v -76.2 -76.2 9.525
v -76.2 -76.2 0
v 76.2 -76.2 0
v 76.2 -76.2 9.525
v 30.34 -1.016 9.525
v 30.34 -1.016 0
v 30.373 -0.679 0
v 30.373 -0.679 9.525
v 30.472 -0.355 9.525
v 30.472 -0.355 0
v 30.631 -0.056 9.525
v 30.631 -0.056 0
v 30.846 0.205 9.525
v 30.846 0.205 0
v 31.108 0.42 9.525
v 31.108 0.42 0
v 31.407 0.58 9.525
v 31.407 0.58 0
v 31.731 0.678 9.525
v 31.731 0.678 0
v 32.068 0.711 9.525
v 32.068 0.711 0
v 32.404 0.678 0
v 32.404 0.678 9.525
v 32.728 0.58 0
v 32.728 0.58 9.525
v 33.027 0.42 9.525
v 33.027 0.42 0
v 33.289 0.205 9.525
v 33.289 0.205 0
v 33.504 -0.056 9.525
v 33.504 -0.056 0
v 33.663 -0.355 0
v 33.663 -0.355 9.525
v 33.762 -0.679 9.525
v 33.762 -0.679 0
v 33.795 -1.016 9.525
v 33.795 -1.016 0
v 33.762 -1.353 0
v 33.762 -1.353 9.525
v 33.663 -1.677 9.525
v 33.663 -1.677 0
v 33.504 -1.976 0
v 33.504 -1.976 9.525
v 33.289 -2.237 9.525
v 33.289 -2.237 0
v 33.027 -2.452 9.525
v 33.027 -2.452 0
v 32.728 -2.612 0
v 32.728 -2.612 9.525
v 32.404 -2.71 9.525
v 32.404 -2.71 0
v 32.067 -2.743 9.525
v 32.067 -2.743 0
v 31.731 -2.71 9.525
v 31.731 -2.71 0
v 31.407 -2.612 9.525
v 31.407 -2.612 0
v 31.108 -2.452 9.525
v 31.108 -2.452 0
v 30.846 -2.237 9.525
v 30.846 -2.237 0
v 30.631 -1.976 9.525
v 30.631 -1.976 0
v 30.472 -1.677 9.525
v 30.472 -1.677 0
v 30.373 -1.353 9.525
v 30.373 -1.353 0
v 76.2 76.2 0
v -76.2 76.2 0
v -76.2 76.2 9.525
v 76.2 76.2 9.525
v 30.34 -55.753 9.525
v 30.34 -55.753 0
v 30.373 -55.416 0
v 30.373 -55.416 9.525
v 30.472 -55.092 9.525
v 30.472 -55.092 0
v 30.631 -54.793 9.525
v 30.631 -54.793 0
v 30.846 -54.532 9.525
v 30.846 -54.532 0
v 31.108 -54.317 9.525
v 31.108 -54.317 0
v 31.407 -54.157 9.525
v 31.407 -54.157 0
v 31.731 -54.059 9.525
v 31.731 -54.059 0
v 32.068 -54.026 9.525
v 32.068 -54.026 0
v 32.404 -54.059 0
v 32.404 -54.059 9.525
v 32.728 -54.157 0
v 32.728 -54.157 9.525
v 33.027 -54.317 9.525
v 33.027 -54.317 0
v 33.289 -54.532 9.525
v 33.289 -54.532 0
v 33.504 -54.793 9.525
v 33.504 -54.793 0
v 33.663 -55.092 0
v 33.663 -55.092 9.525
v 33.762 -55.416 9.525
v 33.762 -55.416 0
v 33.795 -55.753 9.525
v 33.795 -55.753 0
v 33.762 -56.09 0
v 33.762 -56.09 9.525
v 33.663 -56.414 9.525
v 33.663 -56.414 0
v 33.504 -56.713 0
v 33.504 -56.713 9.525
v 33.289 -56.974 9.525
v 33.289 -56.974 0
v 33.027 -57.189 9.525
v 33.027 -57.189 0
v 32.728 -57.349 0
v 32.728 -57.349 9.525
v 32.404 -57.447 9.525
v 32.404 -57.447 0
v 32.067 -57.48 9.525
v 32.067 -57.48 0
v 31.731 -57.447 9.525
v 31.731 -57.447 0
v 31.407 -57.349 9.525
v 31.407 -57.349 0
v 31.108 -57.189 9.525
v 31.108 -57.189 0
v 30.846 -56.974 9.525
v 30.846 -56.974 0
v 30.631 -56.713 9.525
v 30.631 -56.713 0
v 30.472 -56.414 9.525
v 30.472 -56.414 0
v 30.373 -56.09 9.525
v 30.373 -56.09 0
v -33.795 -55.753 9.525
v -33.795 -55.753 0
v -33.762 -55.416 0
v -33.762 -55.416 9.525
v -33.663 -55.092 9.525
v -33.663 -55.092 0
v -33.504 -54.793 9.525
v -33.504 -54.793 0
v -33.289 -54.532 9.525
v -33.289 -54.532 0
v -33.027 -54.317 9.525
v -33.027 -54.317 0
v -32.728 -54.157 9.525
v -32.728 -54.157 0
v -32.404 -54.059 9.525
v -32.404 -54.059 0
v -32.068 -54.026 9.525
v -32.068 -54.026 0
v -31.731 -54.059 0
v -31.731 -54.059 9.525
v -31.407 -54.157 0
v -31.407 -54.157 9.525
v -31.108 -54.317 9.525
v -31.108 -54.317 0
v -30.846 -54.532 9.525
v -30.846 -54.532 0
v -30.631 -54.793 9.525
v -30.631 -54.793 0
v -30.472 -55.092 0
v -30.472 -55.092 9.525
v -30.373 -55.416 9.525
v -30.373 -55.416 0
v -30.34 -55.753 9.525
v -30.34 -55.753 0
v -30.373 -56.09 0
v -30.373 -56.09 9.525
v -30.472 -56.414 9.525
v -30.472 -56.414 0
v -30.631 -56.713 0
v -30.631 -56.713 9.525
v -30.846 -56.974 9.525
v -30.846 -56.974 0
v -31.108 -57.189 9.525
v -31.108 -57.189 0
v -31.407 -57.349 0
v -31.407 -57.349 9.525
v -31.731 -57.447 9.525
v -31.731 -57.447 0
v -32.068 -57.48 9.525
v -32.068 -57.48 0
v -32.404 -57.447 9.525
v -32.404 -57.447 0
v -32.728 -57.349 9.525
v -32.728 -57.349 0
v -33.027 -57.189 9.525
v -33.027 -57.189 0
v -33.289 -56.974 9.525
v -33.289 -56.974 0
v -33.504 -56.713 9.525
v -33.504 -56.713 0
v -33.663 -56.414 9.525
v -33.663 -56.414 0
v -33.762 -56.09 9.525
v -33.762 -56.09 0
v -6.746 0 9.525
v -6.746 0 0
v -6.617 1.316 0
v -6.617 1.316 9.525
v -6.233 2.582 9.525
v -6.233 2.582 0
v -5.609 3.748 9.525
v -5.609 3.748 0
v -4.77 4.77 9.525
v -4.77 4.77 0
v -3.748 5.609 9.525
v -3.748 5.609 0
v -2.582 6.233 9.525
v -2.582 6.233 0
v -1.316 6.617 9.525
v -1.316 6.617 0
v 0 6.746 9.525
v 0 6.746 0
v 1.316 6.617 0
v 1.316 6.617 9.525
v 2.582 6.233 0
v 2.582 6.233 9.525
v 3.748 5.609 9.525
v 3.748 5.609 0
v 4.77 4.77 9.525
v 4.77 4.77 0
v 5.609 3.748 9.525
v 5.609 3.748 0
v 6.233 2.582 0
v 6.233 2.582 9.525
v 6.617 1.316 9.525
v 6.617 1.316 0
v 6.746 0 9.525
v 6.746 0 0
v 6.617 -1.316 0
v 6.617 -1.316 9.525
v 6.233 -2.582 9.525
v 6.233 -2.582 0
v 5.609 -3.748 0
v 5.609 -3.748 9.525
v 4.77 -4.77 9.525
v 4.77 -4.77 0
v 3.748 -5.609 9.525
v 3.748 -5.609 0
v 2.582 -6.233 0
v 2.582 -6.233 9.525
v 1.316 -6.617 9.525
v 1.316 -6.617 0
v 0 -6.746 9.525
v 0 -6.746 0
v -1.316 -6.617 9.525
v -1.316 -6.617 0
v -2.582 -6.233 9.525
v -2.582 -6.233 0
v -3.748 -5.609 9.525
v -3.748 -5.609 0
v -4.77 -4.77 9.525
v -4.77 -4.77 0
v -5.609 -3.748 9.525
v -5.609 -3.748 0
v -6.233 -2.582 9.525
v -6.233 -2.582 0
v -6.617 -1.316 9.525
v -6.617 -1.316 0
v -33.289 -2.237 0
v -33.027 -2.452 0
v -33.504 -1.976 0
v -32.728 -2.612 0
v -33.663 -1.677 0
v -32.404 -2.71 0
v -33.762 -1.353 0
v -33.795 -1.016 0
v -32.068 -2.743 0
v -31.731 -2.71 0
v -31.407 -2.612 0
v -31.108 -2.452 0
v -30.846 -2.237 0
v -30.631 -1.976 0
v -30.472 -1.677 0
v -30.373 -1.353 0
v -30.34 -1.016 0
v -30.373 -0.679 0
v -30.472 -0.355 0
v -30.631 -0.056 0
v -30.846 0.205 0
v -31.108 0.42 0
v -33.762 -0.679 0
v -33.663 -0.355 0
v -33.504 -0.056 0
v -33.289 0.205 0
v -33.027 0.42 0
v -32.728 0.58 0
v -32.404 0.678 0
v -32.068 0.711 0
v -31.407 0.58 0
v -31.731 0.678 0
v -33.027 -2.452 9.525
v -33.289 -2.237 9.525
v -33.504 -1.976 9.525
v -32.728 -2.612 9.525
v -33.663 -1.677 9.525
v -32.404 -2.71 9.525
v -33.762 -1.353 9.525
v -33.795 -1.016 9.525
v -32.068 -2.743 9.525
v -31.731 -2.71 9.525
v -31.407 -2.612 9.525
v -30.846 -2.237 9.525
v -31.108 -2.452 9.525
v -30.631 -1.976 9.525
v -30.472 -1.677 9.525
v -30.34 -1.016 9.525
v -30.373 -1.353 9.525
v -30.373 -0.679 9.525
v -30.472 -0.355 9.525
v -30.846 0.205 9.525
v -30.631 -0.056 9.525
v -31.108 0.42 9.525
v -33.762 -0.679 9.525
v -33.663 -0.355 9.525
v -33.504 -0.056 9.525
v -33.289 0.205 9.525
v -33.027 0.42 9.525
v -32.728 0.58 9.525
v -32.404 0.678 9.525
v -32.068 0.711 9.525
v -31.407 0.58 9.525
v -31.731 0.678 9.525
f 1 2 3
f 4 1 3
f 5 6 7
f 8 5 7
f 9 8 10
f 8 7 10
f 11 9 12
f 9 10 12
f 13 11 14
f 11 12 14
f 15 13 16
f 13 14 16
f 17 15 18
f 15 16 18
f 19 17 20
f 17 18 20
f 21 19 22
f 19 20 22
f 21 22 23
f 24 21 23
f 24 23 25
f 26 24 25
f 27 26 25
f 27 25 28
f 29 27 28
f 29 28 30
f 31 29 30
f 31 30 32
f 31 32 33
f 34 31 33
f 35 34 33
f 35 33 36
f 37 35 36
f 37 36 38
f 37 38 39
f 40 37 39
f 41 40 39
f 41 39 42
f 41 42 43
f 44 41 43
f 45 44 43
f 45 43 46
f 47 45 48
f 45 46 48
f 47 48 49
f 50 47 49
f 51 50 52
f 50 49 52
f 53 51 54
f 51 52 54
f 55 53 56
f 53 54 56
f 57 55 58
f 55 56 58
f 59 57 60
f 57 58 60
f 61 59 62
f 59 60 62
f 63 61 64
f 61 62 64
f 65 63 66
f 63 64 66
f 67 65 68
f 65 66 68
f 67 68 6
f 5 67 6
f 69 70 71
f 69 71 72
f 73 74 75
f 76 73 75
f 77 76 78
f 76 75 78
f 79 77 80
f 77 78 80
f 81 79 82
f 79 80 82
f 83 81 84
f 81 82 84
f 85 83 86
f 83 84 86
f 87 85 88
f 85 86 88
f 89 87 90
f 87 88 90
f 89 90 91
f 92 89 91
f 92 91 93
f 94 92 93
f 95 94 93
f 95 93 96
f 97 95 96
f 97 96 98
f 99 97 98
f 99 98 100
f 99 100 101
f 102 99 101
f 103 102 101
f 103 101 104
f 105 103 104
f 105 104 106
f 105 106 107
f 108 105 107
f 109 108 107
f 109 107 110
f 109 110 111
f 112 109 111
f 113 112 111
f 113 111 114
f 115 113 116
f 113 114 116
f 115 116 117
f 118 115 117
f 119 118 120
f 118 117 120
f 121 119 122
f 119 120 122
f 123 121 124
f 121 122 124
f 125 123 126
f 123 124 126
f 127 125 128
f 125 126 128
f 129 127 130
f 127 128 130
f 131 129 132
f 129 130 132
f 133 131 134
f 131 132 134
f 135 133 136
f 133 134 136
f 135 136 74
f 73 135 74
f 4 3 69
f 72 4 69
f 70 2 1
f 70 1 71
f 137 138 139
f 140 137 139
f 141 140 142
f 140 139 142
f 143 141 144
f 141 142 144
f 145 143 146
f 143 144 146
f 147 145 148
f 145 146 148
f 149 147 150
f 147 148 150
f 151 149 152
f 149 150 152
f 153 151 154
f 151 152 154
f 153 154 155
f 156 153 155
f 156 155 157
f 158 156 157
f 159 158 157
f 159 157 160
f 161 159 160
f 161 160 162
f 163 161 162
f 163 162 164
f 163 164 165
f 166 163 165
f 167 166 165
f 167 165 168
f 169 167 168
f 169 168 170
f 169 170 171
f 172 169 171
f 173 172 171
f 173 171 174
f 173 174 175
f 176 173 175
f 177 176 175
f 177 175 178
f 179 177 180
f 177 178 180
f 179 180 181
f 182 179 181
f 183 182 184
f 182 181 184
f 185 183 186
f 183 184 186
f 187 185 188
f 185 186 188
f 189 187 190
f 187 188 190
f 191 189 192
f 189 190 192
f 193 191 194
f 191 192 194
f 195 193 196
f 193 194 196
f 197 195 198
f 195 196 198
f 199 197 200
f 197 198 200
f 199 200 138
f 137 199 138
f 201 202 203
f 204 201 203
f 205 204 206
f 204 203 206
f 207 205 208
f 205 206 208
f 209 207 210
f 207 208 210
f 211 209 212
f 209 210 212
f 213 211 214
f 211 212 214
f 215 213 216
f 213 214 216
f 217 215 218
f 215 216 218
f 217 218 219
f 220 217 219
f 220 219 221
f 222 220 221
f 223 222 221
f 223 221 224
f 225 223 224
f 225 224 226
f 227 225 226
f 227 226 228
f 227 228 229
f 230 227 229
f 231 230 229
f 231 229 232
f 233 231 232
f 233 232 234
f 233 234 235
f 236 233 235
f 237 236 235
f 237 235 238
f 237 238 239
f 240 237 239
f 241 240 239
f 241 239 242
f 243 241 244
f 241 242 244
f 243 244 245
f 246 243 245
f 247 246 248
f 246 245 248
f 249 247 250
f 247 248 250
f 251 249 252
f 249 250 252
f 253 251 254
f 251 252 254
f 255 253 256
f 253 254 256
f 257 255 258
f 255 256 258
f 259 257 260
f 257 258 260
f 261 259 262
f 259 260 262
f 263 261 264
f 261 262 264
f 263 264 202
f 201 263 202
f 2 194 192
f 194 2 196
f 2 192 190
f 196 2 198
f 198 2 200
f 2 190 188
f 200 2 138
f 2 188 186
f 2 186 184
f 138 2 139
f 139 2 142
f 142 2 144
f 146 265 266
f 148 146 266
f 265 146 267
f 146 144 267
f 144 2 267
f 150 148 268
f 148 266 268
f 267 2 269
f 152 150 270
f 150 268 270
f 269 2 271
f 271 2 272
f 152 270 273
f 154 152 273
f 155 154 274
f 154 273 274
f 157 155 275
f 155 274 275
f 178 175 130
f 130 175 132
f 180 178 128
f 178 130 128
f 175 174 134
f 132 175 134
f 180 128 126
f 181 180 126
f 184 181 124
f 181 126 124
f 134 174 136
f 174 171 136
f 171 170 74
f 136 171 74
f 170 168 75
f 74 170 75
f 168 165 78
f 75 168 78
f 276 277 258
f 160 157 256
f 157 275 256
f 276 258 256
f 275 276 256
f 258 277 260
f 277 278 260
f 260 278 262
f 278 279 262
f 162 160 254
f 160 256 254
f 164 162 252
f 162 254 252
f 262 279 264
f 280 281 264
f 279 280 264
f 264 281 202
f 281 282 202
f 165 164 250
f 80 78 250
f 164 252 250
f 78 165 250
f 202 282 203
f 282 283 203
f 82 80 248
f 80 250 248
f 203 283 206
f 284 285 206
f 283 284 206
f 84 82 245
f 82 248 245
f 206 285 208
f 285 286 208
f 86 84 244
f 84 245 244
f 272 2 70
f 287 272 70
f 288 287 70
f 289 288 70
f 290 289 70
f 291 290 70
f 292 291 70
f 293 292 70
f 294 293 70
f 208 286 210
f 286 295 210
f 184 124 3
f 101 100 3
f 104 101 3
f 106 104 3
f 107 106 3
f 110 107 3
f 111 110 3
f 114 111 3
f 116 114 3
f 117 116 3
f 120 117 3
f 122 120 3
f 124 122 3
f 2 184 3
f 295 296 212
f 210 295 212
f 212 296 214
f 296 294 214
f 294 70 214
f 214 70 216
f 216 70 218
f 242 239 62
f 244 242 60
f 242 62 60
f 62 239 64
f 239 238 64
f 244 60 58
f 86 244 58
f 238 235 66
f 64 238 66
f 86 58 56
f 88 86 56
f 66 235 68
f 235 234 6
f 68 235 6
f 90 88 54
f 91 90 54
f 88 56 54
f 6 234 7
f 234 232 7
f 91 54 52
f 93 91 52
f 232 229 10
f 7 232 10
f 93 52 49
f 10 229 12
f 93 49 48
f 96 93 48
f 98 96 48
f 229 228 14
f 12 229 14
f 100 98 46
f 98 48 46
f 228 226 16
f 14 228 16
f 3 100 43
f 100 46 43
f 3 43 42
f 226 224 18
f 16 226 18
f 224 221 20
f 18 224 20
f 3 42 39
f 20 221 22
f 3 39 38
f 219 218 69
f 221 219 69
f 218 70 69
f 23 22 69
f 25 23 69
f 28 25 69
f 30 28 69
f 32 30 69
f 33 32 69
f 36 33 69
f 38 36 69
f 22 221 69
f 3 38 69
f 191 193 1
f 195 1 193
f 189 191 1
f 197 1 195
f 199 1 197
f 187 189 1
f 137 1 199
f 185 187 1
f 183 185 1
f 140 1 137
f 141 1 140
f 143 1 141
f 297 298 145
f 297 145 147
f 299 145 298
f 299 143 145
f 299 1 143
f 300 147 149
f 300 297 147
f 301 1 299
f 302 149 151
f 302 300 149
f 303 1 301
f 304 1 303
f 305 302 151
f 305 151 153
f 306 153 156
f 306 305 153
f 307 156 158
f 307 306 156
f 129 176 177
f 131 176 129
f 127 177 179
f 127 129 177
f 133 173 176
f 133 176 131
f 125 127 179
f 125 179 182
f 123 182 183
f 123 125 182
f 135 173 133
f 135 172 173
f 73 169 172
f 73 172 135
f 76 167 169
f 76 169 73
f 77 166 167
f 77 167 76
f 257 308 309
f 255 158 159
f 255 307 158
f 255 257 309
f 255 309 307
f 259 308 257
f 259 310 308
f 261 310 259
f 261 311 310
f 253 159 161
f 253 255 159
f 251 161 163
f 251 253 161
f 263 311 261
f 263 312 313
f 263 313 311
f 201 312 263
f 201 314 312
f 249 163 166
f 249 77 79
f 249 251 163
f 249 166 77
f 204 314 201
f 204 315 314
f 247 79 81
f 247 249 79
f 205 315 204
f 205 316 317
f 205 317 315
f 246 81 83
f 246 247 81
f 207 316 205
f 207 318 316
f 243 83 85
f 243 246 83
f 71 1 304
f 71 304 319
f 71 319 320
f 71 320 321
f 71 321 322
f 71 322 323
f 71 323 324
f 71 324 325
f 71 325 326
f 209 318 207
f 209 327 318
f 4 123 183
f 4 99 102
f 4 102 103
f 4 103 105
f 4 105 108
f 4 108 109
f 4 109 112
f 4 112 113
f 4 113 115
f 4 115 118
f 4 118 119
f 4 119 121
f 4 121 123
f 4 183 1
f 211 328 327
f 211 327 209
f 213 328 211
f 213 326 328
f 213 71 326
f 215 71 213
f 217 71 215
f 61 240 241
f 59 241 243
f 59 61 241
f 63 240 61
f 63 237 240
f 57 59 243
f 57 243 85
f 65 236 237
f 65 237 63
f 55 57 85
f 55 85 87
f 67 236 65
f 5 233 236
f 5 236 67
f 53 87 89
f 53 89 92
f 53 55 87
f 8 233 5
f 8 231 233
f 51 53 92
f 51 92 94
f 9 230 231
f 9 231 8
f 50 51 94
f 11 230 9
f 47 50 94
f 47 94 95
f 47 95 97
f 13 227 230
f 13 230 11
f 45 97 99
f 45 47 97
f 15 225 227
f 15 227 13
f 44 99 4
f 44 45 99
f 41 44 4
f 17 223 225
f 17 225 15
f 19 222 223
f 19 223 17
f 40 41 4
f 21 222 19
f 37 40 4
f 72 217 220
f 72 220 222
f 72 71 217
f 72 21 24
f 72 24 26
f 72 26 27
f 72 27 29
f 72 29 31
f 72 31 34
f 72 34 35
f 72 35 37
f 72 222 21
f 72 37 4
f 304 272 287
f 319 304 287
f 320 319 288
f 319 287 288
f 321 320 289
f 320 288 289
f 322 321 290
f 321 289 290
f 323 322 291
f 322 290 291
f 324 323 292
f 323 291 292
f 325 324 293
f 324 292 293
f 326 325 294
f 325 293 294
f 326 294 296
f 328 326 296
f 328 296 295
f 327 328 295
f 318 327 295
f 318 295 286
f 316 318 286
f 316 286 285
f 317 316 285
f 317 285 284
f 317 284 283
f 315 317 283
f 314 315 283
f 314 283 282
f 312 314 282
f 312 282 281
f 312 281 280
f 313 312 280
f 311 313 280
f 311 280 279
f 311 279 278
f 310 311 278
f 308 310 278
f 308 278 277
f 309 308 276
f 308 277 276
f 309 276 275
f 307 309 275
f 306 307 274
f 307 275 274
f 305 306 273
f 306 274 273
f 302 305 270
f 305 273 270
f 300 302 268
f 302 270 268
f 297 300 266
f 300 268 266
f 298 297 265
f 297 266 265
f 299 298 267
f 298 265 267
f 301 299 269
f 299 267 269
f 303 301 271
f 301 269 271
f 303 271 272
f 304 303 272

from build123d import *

# Parameters (mm, degrees)
F0_W     = 152.4
F0_H     = 152.4
F1_DEPTH = 9.525
F3_D     = 3.4544
F5_D     = 13.49248


with BuildPart() as f1:
    # F0 (on Top) → F1 (new body)
    with BuildSketch(Plane.XY):
        Rectangle(F0_W, F0_H)
    extrude(amount=F1_DEPTH)

    # F3 (through all)
    with Locations(Plane.XY.offset(9.525)):
        with Locations((-32.0675, -1.016), (-32.0675, -55.753), (32.0675, -55.753), (32.0675, -1.016)):
            Hole(F3_D / 2)

    # F5 (through all)
    with Locations(Plane.XY.offset(9.525)):
        with Locations((0, 0)):
            Hole(F5_D / 2)


solid = f1.part
